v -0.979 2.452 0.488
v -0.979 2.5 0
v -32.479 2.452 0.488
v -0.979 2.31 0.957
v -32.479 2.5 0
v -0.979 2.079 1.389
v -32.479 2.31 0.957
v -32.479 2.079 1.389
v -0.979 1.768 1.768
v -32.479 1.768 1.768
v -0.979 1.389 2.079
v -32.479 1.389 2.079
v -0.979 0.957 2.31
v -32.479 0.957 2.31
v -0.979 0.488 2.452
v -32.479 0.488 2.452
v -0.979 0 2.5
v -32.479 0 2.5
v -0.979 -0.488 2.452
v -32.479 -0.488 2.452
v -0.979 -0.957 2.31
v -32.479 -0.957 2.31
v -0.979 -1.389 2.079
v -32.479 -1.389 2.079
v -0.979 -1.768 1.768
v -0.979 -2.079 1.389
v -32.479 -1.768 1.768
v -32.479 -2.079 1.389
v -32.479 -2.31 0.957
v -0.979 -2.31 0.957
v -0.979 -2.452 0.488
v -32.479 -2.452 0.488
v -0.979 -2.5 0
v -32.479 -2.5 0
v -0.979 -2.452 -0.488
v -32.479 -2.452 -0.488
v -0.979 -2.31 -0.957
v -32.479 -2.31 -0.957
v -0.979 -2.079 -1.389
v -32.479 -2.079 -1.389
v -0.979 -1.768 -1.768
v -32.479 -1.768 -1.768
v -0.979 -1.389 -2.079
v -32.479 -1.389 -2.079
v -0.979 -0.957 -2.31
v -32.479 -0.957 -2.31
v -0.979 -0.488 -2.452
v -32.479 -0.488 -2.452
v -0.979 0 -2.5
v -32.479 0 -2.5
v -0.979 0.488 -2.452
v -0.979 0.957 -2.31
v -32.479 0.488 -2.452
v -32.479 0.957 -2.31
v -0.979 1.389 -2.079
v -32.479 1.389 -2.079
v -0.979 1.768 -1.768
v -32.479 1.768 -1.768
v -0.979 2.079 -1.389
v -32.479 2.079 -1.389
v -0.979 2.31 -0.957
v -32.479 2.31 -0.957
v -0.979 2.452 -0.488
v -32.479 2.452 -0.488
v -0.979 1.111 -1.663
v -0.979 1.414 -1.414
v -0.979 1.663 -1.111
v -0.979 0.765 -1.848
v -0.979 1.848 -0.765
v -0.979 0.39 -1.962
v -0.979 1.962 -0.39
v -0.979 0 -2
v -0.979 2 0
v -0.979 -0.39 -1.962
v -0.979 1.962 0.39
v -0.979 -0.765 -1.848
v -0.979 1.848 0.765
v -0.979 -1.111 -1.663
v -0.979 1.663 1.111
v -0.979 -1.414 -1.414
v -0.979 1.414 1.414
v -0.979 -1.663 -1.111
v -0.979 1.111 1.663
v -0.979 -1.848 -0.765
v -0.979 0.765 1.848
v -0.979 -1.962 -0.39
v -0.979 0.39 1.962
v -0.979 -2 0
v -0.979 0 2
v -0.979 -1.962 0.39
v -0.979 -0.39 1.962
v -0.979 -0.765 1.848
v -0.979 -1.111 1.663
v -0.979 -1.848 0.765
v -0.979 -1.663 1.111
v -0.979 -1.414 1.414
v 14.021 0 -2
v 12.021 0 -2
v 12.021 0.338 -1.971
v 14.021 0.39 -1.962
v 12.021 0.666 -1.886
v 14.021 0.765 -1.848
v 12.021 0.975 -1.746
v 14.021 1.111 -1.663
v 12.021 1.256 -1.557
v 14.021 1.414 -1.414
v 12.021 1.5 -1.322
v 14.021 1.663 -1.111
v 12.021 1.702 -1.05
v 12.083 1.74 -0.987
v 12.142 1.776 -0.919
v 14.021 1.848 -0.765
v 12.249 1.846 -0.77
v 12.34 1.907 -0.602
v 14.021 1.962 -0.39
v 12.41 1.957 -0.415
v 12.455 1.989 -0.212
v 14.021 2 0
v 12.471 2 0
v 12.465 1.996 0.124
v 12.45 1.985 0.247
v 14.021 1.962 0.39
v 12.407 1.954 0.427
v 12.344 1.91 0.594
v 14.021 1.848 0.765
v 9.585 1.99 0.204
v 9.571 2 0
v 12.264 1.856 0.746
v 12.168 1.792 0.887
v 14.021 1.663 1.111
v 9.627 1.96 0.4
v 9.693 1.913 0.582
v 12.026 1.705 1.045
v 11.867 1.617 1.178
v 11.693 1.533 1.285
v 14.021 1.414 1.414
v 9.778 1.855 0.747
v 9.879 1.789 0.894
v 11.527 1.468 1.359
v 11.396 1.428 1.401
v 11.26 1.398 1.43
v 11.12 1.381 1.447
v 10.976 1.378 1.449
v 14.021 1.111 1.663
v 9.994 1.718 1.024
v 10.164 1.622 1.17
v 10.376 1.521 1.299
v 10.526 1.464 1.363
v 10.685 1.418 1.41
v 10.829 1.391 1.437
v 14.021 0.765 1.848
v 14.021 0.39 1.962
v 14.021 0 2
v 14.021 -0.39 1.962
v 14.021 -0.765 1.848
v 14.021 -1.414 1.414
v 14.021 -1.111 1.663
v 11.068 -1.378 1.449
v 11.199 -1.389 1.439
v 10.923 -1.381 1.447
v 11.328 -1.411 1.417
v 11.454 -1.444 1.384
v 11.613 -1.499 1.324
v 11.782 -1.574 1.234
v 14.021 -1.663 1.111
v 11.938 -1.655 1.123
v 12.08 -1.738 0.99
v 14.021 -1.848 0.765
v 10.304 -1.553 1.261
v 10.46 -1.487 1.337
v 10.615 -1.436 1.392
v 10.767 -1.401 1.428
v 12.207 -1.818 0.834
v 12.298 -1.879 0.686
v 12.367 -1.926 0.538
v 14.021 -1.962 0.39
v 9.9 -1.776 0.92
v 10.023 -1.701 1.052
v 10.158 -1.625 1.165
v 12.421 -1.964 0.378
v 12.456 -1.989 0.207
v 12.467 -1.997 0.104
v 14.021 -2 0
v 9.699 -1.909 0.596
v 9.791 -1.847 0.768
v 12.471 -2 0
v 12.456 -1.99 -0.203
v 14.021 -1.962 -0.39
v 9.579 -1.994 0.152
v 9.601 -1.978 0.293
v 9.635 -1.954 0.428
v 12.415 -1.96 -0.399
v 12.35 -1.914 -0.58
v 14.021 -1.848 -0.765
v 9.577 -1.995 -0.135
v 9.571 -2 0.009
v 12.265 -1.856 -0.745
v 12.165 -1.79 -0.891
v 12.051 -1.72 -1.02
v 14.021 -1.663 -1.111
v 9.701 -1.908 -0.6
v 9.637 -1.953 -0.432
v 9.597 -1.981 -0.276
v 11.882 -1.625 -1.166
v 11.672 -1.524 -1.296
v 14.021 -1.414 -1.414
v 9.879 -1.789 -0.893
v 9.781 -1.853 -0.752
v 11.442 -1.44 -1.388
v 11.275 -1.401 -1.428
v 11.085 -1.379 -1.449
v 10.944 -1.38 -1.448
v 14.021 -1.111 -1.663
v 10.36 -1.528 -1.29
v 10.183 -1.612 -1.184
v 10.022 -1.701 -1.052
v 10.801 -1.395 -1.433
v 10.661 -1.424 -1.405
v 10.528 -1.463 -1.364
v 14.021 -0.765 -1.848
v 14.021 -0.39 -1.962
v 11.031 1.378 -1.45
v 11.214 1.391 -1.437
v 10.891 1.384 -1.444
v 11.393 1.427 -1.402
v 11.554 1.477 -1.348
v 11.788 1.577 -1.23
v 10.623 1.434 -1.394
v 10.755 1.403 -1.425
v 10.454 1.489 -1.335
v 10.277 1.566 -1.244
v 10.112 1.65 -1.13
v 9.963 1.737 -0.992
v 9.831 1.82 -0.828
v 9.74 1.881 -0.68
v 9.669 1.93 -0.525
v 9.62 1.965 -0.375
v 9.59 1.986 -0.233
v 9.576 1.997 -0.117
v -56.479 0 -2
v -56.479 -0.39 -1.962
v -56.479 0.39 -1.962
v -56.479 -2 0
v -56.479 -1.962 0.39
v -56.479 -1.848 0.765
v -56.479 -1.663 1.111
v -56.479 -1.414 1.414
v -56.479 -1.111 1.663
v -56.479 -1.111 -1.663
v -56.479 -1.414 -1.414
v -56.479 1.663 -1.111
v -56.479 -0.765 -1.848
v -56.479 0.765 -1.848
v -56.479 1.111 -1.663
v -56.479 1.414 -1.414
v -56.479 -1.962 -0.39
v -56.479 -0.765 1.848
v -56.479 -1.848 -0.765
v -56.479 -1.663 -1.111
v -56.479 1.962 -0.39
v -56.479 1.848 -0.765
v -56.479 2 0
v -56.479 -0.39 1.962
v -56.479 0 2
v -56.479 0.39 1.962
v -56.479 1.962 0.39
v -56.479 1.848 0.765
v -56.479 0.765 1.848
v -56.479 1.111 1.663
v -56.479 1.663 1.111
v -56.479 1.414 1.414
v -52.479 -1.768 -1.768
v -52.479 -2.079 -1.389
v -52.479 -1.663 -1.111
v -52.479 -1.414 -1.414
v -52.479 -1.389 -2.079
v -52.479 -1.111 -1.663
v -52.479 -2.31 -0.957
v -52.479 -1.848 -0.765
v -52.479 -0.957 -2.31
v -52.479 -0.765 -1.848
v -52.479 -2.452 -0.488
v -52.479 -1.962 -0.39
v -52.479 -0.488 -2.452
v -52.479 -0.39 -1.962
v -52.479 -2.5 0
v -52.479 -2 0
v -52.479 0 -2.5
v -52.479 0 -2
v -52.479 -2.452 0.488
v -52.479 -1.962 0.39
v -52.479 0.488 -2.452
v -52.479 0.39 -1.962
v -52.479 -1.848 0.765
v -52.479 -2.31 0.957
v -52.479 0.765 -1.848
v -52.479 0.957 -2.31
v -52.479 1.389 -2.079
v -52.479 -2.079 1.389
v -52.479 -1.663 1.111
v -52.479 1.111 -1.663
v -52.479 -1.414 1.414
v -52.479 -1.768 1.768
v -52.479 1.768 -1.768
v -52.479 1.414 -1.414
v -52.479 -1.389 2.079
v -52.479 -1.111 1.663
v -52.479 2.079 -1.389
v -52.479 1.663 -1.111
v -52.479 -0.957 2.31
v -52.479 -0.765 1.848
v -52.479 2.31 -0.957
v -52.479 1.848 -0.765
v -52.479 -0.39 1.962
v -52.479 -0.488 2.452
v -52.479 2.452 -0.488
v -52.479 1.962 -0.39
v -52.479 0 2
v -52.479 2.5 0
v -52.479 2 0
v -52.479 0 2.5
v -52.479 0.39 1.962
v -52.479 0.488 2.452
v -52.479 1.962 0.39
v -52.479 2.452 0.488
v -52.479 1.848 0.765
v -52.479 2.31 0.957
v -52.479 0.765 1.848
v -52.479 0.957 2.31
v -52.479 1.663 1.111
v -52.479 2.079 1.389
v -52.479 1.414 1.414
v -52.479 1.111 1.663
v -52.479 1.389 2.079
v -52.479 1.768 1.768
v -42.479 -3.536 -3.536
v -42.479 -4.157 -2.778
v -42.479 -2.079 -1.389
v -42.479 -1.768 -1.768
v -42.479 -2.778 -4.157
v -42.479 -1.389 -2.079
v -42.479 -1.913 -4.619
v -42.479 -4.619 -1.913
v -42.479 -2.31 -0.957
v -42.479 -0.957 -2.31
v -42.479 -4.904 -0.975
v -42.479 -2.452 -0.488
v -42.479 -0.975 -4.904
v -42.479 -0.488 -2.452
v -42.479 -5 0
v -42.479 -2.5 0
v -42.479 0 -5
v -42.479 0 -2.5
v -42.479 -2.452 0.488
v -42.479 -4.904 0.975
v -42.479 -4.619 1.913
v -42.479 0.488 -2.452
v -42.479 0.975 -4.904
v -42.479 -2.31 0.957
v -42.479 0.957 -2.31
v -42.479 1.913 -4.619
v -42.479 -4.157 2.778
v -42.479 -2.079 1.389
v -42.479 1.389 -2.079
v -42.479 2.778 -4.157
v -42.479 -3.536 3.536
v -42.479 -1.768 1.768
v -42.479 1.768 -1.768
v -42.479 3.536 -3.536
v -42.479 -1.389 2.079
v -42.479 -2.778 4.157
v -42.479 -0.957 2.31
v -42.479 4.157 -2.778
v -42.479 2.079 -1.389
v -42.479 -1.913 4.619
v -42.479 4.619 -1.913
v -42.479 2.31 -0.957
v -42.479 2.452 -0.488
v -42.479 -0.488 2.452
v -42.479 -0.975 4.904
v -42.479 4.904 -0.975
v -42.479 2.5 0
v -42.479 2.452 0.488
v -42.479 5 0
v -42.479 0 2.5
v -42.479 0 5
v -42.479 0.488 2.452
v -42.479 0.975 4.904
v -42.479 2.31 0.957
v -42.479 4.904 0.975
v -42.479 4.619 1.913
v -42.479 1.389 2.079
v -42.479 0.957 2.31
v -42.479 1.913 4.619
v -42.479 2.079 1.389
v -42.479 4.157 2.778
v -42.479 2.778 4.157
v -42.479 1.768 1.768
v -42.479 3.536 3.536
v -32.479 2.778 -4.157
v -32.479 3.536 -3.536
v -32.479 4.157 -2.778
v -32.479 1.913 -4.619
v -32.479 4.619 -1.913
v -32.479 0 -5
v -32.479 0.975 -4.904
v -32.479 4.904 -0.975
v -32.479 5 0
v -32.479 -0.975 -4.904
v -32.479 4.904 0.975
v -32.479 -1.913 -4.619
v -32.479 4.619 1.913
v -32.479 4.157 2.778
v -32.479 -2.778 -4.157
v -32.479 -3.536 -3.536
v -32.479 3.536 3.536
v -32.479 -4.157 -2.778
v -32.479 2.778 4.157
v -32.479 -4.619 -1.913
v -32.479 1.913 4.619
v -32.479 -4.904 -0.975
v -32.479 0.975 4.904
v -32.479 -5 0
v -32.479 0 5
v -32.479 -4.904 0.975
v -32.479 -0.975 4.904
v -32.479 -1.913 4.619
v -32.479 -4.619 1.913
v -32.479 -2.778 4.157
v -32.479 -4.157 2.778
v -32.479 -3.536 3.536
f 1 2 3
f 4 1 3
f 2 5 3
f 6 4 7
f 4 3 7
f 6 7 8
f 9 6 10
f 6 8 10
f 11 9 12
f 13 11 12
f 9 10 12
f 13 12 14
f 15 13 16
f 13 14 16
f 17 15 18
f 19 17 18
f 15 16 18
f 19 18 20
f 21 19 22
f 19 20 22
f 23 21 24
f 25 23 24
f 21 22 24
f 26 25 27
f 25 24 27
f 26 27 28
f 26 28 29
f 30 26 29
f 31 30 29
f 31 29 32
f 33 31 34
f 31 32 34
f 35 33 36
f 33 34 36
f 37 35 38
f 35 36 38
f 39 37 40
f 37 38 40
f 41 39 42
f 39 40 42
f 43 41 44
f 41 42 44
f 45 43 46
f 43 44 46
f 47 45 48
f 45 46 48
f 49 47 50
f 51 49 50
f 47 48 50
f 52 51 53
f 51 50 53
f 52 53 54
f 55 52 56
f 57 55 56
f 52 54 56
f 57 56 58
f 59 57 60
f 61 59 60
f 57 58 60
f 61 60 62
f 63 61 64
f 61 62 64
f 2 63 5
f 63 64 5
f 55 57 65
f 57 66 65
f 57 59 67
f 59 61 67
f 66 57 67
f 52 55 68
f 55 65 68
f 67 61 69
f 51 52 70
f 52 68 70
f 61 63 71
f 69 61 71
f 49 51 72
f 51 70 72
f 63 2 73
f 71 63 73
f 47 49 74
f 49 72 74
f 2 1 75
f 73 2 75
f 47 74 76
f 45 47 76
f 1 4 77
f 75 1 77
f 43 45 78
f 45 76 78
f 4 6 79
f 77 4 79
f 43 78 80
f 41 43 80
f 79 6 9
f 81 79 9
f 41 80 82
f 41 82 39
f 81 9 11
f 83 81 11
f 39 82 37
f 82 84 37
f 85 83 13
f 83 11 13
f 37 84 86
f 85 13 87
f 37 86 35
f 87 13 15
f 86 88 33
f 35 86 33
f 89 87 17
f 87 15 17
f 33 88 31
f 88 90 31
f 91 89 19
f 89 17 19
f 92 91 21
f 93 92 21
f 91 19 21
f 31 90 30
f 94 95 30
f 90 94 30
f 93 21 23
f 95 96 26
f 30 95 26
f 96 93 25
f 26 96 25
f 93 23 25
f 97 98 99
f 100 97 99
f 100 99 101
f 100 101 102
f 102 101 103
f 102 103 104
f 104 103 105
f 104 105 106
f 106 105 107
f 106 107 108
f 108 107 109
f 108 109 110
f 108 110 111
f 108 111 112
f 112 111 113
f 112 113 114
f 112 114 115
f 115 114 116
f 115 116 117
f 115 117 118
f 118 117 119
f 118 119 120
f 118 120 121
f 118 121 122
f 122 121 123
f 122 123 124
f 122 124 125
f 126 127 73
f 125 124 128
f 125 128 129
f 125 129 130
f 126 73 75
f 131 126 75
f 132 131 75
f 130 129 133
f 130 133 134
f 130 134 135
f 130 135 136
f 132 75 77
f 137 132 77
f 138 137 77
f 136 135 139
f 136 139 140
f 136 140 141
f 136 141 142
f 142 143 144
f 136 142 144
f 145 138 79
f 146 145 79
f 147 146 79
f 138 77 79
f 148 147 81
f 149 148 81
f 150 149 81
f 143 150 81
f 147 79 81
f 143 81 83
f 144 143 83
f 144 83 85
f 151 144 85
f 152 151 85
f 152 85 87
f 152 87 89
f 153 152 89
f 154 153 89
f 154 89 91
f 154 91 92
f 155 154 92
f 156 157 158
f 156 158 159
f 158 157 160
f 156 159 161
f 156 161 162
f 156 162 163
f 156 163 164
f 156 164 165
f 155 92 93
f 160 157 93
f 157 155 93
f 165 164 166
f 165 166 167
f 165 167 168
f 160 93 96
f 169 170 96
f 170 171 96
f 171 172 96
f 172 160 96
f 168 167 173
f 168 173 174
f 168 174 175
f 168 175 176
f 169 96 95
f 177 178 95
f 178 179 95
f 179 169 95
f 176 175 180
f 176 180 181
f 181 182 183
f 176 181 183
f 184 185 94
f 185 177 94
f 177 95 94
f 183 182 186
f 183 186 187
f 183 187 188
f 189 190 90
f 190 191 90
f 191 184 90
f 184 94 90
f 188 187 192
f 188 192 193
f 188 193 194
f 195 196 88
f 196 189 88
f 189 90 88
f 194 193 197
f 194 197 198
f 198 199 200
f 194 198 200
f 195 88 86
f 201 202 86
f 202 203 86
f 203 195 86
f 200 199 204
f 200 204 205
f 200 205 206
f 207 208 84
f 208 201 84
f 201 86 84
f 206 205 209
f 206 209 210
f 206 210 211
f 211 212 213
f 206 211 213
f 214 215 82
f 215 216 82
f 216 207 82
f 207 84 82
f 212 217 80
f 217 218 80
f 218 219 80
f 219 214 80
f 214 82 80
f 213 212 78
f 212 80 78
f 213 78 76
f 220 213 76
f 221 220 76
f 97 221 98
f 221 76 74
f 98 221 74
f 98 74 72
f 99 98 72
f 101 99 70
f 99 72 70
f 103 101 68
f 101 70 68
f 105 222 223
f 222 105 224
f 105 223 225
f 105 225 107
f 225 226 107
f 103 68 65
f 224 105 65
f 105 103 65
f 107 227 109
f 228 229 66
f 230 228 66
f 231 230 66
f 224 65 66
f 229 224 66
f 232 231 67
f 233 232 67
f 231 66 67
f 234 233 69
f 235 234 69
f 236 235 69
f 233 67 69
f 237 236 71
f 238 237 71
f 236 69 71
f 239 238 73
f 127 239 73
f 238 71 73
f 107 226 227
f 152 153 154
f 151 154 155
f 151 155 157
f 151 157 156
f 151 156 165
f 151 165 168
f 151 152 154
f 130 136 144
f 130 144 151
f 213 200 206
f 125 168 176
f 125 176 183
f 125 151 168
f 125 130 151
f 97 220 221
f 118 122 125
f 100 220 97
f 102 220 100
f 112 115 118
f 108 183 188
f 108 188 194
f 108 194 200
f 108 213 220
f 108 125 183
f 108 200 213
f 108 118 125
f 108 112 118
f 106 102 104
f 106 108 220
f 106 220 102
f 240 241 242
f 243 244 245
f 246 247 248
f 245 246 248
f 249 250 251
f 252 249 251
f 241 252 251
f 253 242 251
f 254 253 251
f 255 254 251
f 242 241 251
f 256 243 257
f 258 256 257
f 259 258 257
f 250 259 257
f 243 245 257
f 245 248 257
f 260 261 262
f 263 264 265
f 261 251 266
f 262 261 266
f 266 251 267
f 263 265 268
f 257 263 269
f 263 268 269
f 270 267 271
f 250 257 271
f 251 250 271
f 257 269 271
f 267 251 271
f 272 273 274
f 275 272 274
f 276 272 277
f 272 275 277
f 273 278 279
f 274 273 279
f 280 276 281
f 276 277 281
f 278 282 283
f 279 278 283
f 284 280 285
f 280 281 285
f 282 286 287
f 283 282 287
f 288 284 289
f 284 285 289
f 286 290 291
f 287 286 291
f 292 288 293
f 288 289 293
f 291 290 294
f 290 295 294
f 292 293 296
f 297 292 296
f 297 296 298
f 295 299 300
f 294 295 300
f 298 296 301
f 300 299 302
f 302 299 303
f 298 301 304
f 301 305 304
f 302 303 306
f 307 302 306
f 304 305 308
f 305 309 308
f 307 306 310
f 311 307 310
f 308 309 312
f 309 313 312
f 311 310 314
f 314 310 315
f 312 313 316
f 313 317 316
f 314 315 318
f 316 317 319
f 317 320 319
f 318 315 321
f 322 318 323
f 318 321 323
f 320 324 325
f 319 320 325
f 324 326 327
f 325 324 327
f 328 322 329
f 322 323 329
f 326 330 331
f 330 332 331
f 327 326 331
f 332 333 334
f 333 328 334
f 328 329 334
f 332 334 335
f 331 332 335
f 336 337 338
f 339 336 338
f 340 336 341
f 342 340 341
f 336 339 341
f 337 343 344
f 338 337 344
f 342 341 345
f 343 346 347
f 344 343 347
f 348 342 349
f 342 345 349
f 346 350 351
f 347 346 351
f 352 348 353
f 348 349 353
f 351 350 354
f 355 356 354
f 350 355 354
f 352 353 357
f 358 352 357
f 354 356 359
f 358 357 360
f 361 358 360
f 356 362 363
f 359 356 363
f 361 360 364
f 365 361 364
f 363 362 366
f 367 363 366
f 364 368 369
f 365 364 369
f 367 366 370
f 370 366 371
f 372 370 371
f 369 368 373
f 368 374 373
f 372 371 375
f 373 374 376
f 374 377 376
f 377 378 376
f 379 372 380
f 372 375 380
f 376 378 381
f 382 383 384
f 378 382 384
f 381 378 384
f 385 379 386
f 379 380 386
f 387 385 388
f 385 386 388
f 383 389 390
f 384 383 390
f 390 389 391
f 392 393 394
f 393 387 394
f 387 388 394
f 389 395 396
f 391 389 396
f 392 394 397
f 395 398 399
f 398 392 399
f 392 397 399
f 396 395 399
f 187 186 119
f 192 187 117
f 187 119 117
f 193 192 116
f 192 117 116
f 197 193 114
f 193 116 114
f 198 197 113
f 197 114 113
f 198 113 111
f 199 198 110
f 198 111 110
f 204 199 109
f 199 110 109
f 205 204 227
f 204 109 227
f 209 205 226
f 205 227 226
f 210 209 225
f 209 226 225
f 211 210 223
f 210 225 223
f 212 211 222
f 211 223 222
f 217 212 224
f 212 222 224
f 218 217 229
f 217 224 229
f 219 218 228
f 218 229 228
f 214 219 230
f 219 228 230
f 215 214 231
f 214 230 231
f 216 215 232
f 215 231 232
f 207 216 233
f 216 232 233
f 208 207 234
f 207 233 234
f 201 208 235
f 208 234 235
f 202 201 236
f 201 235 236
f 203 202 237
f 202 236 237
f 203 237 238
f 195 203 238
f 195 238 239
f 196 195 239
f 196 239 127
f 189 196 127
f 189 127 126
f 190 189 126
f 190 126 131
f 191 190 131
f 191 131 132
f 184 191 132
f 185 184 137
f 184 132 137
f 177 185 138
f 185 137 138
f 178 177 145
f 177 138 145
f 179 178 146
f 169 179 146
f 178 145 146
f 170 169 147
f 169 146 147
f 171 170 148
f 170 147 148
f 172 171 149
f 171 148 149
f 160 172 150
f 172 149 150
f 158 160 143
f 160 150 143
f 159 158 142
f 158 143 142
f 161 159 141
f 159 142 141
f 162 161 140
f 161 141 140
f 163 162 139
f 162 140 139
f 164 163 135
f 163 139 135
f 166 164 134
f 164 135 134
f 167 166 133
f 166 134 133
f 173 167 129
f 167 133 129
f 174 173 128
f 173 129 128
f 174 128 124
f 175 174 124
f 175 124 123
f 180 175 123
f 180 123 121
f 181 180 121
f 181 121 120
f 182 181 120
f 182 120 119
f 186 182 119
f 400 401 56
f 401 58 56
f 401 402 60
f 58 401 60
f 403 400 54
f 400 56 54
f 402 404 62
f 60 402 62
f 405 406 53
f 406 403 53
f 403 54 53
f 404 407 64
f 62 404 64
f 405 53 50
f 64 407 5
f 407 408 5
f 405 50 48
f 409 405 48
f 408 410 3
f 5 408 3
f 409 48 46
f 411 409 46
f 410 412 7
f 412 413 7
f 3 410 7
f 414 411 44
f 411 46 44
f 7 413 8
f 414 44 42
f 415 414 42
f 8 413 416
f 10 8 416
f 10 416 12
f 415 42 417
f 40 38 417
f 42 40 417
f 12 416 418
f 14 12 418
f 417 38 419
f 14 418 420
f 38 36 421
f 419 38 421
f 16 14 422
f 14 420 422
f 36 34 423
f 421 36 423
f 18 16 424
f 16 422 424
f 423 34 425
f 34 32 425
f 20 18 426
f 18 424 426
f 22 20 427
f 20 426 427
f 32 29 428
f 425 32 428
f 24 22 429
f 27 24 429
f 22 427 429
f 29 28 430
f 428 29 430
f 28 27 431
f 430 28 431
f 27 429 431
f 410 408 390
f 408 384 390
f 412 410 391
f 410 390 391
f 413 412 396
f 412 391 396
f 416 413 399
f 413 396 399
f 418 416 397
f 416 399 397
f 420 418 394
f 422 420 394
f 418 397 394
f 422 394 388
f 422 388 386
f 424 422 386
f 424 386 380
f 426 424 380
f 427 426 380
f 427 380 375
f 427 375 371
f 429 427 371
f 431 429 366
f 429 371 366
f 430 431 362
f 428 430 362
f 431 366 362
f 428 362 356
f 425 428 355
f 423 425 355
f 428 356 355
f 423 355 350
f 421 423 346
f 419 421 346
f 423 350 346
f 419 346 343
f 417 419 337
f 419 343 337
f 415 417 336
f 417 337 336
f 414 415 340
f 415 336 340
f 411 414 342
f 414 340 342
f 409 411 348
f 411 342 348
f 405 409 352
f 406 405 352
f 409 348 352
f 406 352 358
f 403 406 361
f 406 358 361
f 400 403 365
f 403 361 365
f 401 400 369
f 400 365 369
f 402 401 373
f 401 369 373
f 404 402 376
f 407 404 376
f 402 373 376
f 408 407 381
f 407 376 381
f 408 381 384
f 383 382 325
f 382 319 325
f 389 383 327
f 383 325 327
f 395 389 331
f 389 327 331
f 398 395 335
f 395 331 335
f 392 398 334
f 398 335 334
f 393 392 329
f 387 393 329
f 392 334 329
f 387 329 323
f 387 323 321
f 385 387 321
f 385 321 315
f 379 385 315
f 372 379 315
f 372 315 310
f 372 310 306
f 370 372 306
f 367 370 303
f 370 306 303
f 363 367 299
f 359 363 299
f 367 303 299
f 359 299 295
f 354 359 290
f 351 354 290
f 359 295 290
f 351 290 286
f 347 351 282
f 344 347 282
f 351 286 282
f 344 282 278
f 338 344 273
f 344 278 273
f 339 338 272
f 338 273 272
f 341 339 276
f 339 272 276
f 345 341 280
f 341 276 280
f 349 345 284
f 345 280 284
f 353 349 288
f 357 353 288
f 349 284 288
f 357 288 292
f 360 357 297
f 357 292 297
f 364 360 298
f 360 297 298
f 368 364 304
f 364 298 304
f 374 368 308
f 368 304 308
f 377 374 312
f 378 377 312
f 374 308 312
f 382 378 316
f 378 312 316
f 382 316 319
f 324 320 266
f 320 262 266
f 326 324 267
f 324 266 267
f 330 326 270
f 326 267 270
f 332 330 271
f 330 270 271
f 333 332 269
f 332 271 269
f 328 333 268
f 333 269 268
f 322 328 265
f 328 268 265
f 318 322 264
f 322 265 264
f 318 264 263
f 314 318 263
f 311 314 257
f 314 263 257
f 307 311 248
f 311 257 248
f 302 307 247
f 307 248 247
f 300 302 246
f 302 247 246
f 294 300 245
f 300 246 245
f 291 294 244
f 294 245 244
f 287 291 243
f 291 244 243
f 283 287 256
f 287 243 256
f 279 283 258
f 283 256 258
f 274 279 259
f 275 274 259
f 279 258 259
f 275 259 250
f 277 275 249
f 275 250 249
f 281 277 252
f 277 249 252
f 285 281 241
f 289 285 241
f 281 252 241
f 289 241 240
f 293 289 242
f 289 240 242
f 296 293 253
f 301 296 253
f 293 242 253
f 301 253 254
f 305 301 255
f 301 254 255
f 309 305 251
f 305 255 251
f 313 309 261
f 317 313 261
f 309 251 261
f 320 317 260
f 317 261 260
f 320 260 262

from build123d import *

# Parameters (mm, degrees)
SKETCH_2_R          = 2
EXTRUDE_1_DEPTH     = 2
SKETCH_5_R          = 1.45
CUT_EXTRUDE_4_DEPTH = 5


with BuildPart() as part:
    # 草图1 → 旋转1 (revolve)
    with BuildSketch(Plane.XY):
        Polygon((-52.479220812, 2.5), (-52.479220812, 2), (-56.479220812, 2), (-56.479220812, 0), (12.020779188, 0), (12.020779188, 2), (-0.979220812, 2), (-0.979220812, 2.5), (-32.479220812, 2.5), (-32.479220812, 5), (-42.479220812, 5), (-42.479220812, 2.5), align=None)
    revolve(axis=Axis((-56.479220812, 0, 0), (1, 0, 0)))

    # 草图2 → 凸台-拉伸1 (add)
    with BuildSketch(Plane(origin=(12.020779188, 0, 0), x_dir=(0, 0, -1), z_dir=(1, 0, 0))):
        Circle(SKETCH_2_R)
    extrude(amount=EXTRUDE_1_DEPTH)

    # 草图5 → 切除-拉伸4 (cut, symmetric)
    with BuildSketch(Plane(origin=(0, 0, 0), x_dir=(1, 0, 0), z_dir=(0, 1, 0))):
        with Locations((11.020779188, 0)):
            Circle(SKETCH_5_R)
    extrude(amount=CUT_EXTRUDE_4_DEPTH, both=True, mode=Mode.SUBTRACT)


solid = part.part
